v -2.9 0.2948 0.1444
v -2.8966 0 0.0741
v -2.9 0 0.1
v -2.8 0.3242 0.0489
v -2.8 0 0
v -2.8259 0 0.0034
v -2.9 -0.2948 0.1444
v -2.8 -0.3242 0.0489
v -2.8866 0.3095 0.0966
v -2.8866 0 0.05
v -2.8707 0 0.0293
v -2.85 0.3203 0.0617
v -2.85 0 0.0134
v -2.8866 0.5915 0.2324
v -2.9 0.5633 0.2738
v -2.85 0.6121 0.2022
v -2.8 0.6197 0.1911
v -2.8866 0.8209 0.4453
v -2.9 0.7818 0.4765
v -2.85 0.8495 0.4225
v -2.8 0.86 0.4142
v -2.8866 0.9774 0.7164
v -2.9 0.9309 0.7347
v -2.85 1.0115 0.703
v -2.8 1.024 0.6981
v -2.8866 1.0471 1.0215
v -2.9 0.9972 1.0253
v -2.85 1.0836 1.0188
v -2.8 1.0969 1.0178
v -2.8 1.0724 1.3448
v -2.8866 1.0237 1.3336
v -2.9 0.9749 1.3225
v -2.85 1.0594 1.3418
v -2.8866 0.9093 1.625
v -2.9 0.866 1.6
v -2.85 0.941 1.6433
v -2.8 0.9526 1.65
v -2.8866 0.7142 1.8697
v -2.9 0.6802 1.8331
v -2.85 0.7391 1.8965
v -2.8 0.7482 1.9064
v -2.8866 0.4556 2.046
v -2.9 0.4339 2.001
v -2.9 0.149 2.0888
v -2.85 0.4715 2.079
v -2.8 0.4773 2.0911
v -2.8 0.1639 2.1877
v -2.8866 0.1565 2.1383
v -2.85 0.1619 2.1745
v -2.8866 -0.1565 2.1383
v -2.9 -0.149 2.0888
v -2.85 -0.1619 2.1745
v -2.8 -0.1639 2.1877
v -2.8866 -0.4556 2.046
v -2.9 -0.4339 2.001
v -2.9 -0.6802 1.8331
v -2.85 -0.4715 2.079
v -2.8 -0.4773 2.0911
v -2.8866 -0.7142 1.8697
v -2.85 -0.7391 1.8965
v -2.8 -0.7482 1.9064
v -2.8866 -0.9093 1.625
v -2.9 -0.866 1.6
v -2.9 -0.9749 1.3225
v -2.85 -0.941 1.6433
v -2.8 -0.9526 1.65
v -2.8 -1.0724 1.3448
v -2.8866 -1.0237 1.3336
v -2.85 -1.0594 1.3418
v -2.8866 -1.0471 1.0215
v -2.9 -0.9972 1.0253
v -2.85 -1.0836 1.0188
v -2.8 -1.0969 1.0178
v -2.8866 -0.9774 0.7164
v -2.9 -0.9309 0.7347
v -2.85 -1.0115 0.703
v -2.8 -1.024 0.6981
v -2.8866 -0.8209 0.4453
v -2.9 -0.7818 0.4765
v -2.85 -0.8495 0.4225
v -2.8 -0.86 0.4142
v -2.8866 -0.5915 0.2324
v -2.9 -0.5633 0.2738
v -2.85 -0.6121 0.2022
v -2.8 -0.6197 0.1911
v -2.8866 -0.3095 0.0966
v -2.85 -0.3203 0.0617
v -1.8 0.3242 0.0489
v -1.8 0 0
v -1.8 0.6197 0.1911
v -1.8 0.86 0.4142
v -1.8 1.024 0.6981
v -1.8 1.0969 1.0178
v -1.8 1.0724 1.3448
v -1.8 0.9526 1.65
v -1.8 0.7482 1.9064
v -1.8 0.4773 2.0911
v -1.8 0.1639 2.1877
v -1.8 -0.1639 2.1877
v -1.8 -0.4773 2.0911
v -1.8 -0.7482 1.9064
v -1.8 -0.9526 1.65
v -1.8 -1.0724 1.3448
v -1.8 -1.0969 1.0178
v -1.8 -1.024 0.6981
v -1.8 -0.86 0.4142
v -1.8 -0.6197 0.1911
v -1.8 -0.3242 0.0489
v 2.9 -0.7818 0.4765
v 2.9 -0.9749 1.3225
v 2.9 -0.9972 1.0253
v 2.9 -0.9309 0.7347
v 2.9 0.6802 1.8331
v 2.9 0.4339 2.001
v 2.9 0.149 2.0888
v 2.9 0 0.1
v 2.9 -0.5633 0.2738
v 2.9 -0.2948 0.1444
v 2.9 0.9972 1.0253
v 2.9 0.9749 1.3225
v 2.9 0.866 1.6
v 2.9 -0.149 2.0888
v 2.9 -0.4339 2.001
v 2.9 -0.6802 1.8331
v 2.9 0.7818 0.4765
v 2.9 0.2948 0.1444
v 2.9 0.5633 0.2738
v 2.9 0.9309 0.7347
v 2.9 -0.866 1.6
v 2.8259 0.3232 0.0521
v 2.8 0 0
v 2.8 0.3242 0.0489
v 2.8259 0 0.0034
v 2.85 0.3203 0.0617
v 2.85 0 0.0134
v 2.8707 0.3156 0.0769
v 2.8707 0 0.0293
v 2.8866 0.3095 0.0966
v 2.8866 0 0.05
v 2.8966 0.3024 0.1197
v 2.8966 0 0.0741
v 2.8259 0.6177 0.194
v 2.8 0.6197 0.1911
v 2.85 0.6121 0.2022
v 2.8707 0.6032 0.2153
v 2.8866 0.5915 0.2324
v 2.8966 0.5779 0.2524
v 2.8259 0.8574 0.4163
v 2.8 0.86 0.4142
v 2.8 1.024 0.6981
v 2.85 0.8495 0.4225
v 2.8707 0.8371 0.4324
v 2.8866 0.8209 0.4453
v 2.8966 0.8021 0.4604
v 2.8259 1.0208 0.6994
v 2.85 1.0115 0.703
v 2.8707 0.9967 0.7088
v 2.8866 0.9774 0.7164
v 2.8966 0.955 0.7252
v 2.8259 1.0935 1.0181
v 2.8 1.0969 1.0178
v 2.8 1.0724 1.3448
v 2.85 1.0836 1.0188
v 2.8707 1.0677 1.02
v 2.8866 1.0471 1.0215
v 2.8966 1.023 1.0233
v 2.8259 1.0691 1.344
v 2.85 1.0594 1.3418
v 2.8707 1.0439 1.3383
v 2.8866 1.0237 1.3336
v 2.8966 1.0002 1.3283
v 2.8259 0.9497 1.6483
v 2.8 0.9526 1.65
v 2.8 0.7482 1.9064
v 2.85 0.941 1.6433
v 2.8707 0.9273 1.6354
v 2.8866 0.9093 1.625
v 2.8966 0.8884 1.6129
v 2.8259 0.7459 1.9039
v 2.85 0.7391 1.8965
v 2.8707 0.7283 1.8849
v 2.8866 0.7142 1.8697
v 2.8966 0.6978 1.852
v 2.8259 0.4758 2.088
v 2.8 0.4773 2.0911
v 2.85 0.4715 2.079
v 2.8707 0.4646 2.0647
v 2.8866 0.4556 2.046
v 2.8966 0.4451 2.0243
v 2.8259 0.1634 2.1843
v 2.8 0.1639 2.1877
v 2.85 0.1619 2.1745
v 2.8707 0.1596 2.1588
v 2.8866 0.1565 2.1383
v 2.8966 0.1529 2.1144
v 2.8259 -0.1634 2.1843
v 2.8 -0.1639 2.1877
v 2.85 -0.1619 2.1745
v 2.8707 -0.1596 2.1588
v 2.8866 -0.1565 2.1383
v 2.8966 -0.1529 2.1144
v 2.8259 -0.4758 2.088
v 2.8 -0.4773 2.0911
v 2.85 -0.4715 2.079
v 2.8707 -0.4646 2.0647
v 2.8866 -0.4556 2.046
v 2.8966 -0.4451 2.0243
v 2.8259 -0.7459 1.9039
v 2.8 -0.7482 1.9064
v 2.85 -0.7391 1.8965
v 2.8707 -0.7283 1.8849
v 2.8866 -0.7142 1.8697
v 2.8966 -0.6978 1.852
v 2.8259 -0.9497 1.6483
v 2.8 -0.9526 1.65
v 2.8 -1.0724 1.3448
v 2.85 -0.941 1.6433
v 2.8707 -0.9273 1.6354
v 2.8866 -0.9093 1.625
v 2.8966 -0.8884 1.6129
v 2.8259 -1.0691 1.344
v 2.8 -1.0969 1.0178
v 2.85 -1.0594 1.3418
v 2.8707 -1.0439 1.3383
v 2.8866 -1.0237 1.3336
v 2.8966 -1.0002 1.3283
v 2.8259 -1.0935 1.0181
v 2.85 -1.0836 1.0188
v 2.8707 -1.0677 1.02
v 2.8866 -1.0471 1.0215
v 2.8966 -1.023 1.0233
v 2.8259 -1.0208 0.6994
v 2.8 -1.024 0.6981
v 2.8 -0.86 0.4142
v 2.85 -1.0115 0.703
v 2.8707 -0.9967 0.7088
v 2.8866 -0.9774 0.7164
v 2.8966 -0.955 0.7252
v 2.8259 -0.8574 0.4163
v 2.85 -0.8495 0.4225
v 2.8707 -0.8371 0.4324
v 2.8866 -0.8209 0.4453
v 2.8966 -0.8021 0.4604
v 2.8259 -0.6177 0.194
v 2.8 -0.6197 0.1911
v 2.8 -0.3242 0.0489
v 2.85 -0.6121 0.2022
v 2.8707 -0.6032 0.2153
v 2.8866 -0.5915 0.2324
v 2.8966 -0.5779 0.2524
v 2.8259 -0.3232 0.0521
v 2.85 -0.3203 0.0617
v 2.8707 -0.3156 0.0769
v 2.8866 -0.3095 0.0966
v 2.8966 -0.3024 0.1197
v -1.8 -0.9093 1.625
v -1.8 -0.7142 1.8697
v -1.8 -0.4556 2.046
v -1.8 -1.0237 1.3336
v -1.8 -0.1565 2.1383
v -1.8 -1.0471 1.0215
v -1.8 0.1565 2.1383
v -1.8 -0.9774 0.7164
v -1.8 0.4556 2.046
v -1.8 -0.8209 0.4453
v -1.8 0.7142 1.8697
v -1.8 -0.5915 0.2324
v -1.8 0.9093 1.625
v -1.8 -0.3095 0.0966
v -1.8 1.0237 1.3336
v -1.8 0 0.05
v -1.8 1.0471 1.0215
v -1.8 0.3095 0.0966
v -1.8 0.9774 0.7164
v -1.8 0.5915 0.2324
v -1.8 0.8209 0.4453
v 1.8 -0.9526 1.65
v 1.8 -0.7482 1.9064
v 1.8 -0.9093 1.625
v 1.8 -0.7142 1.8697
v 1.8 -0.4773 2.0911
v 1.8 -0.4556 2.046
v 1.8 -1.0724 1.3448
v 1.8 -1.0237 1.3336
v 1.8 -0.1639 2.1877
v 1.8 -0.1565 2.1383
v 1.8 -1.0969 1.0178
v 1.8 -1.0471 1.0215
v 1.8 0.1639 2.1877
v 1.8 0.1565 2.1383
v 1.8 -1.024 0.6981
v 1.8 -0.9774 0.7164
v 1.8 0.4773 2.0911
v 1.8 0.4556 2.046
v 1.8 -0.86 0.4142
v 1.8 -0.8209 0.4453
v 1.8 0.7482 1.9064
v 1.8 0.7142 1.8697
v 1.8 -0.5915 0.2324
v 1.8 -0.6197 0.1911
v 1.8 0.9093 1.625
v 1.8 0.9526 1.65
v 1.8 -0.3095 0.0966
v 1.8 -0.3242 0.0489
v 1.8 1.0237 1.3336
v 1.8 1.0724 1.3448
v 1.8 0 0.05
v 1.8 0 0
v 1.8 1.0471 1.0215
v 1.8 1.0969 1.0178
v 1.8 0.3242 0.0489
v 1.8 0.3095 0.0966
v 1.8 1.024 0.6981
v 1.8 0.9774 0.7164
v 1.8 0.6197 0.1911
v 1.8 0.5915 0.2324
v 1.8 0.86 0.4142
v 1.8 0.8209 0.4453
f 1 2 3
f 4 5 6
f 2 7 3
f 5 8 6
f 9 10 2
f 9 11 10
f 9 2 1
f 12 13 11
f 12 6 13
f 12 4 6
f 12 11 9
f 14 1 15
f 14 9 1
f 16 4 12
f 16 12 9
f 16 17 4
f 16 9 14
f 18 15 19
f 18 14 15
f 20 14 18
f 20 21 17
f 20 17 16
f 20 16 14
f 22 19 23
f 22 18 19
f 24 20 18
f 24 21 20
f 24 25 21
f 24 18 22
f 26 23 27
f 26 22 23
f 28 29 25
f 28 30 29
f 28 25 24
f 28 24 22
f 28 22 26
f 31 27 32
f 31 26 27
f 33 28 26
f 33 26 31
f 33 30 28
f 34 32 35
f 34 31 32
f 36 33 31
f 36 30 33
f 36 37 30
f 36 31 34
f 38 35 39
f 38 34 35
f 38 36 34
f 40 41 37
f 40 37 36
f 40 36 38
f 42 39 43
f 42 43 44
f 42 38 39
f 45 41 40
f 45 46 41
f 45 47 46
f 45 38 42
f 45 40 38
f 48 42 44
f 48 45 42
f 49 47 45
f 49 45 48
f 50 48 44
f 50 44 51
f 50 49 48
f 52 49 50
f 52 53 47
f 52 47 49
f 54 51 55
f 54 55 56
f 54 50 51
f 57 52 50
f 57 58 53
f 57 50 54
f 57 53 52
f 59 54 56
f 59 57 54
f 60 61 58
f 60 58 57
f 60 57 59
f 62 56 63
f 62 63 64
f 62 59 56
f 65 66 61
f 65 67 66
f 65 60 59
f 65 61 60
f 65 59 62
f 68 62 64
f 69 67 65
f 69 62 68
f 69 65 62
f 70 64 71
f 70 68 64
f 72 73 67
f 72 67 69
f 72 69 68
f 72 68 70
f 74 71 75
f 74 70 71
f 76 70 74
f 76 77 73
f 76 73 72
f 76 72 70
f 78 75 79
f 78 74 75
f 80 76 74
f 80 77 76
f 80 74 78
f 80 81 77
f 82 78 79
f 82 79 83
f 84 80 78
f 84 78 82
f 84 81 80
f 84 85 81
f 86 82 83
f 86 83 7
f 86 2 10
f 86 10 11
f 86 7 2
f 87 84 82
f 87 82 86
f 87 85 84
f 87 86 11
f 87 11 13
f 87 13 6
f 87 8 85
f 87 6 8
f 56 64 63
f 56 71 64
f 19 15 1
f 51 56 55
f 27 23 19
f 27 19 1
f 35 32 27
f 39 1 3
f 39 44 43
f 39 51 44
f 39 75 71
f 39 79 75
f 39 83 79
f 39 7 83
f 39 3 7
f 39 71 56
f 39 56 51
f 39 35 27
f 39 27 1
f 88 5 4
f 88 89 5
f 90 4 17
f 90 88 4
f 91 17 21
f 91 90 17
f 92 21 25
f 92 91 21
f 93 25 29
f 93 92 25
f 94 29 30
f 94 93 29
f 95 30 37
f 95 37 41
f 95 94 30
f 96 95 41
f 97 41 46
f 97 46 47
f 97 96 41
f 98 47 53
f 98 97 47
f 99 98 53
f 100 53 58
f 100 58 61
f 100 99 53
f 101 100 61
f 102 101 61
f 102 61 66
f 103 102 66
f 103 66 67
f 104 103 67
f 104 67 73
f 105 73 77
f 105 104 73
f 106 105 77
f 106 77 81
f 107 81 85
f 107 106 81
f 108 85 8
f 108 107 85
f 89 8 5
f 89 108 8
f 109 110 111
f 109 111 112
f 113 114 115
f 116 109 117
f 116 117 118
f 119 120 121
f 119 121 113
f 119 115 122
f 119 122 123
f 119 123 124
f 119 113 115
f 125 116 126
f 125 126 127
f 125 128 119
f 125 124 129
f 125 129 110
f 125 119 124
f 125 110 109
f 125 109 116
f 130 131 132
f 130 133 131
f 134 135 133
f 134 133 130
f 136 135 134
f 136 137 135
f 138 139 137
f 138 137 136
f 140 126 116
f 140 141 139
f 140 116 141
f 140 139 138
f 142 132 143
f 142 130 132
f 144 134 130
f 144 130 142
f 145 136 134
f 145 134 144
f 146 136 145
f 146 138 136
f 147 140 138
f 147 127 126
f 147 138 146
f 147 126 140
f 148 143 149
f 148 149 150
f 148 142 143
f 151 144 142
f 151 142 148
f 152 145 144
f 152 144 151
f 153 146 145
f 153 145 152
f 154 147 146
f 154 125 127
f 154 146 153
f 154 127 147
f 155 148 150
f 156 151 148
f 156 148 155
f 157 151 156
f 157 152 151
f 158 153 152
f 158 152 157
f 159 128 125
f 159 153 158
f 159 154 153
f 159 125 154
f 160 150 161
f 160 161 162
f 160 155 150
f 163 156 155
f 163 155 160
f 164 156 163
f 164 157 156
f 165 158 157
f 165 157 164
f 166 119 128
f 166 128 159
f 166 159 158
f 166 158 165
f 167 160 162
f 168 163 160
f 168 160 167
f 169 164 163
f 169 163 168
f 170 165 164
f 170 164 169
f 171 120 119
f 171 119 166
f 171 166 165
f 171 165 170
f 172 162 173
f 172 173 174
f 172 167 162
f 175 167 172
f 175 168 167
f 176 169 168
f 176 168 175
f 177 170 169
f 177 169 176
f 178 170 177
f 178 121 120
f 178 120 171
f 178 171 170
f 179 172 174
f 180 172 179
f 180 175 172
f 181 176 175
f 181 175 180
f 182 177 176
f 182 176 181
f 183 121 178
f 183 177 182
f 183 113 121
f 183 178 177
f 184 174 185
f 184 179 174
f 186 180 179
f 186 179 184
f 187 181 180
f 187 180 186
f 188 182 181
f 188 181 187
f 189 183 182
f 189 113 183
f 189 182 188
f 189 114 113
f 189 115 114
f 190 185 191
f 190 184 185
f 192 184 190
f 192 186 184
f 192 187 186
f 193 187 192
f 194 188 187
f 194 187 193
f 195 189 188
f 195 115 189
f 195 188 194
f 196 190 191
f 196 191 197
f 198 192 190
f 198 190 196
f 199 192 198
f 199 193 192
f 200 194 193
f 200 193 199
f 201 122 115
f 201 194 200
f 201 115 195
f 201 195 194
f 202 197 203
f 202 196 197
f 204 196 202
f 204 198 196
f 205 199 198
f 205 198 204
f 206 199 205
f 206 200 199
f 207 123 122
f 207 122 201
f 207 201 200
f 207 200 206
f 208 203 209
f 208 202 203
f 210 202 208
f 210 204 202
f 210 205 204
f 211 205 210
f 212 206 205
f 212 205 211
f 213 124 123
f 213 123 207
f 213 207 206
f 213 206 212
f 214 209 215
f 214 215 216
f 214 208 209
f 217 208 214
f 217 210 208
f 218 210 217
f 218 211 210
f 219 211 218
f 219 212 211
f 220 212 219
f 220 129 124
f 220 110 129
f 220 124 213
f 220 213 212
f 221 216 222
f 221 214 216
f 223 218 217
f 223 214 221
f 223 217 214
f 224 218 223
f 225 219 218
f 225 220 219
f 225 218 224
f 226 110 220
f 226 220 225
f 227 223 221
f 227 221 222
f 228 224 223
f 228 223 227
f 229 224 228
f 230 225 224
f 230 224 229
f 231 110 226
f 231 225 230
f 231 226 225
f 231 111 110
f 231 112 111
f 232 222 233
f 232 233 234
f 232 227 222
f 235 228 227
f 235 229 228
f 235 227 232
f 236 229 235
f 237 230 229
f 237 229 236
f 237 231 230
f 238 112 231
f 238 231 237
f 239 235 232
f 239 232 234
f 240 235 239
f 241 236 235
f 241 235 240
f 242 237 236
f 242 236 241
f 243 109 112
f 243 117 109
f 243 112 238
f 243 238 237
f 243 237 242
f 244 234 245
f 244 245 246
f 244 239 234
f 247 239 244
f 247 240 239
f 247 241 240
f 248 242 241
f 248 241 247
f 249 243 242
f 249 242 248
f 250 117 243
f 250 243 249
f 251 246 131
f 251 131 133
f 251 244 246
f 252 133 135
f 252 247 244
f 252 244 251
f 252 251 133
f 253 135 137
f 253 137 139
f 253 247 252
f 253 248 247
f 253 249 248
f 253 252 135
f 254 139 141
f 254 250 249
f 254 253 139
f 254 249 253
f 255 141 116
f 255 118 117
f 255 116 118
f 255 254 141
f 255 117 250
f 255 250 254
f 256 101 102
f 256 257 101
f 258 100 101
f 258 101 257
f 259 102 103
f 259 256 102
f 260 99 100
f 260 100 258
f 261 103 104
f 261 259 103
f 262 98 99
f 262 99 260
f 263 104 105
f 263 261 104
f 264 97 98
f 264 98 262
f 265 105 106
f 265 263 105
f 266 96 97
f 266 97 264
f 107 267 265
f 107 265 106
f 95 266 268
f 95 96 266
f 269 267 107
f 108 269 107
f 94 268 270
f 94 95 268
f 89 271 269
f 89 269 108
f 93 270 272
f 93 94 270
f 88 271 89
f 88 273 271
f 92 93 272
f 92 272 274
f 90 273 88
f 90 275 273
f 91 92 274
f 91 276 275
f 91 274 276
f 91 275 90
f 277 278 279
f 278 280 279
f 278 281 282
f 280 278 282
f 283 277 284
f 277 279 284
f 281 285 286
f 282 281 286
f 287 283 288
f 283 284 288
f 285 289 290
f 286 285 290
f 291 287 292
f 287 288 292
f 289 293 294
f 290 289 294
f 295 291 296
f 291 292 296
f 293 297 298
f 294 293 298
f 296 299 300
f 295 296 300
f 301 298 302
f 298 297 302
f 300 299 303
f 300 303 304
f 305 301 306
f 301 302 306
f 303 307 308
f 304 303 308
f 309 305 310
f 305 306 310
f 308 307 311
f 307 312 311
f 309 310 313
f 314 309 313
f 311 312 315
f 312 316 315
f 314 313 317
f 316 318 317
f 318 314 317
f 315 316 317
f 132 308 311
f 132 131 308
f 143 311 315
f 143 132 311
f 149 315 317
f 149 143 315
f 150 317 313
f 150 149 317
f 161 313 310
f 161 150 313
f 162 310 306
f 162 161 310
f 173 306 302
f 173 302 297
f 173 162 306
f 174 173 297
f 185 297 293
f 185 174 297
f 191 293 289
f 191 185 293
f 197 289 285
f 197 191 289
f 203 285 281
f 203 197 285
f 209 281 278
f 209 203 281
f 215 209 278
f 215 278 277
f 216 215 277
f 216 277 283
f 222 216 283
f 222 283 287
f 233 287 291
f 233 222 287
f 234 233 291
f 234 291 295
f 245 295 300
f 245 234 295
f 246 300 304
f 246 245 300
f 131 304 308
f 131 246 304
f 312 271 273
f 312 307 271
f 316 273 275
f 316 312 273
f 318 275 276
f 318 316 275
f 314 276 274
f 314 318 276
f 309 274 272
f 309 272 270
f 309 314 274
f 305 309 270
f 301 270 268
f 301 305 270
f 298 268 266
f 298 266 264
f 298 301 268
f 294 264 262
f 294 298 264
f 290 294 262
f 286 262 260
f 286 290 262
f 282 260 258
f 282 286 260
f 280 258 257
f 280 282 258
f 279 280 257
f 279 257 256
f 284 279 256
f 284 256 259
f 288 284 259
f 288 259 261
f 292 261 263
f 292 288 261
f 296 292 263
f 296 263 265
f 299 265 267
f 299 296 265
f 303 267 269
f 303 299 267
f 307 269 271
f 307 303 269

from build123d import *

# Parameters (mm, degrees)
SKETCH_W = 4.7
SKETCH_H = 1.05


with BuildPart() as revolution:
    # Sketch → Revolution (revolve)
    with BuildSketch(Plane.XZ):
        with Locations((0, 0.575)):
            Rectangle(SKETCH_W, SKETCH_H)
    revolve(axis=Axis((-15.061842, 0, 1.1), (1, 0, 0)))


with BuildPart() as fusion:
    # Sketch001 → Revolution001 (revolve)
    with BuildSketch(Plane.XZ):
        with BuildLine():
            Line((-2.8, 0), (-1.8, 0))
            Line((-1.8, 0), (-1.8, 1))
            Line((-1.8, 1), (1.8, 1))
            Line((1.8, 0), (1.8, 1))
            Line((1.8, 0), (2.8, 0))
            ThreePointArc((2.8, 0), (2.870711, 0.029289), (2.9, 0.1))
            Line((2.9, 0.1), (2.9, 1.1))
            Line((-2.9, 1.1), (2.9, 1.1))
            Line((-2.9, 1.1), (-2.9, 0.1))
            ThreePointArc((-2.9, 0.1), (-2.870711, 0.029289), (-2.8, 0))
        make_face()
    revolve(axis=Axis((-7.1, 0, 1.1), (1, 0, 0)))

    # Fusion: union Revolution
    add(revolution.part)


solid = fusion.part
